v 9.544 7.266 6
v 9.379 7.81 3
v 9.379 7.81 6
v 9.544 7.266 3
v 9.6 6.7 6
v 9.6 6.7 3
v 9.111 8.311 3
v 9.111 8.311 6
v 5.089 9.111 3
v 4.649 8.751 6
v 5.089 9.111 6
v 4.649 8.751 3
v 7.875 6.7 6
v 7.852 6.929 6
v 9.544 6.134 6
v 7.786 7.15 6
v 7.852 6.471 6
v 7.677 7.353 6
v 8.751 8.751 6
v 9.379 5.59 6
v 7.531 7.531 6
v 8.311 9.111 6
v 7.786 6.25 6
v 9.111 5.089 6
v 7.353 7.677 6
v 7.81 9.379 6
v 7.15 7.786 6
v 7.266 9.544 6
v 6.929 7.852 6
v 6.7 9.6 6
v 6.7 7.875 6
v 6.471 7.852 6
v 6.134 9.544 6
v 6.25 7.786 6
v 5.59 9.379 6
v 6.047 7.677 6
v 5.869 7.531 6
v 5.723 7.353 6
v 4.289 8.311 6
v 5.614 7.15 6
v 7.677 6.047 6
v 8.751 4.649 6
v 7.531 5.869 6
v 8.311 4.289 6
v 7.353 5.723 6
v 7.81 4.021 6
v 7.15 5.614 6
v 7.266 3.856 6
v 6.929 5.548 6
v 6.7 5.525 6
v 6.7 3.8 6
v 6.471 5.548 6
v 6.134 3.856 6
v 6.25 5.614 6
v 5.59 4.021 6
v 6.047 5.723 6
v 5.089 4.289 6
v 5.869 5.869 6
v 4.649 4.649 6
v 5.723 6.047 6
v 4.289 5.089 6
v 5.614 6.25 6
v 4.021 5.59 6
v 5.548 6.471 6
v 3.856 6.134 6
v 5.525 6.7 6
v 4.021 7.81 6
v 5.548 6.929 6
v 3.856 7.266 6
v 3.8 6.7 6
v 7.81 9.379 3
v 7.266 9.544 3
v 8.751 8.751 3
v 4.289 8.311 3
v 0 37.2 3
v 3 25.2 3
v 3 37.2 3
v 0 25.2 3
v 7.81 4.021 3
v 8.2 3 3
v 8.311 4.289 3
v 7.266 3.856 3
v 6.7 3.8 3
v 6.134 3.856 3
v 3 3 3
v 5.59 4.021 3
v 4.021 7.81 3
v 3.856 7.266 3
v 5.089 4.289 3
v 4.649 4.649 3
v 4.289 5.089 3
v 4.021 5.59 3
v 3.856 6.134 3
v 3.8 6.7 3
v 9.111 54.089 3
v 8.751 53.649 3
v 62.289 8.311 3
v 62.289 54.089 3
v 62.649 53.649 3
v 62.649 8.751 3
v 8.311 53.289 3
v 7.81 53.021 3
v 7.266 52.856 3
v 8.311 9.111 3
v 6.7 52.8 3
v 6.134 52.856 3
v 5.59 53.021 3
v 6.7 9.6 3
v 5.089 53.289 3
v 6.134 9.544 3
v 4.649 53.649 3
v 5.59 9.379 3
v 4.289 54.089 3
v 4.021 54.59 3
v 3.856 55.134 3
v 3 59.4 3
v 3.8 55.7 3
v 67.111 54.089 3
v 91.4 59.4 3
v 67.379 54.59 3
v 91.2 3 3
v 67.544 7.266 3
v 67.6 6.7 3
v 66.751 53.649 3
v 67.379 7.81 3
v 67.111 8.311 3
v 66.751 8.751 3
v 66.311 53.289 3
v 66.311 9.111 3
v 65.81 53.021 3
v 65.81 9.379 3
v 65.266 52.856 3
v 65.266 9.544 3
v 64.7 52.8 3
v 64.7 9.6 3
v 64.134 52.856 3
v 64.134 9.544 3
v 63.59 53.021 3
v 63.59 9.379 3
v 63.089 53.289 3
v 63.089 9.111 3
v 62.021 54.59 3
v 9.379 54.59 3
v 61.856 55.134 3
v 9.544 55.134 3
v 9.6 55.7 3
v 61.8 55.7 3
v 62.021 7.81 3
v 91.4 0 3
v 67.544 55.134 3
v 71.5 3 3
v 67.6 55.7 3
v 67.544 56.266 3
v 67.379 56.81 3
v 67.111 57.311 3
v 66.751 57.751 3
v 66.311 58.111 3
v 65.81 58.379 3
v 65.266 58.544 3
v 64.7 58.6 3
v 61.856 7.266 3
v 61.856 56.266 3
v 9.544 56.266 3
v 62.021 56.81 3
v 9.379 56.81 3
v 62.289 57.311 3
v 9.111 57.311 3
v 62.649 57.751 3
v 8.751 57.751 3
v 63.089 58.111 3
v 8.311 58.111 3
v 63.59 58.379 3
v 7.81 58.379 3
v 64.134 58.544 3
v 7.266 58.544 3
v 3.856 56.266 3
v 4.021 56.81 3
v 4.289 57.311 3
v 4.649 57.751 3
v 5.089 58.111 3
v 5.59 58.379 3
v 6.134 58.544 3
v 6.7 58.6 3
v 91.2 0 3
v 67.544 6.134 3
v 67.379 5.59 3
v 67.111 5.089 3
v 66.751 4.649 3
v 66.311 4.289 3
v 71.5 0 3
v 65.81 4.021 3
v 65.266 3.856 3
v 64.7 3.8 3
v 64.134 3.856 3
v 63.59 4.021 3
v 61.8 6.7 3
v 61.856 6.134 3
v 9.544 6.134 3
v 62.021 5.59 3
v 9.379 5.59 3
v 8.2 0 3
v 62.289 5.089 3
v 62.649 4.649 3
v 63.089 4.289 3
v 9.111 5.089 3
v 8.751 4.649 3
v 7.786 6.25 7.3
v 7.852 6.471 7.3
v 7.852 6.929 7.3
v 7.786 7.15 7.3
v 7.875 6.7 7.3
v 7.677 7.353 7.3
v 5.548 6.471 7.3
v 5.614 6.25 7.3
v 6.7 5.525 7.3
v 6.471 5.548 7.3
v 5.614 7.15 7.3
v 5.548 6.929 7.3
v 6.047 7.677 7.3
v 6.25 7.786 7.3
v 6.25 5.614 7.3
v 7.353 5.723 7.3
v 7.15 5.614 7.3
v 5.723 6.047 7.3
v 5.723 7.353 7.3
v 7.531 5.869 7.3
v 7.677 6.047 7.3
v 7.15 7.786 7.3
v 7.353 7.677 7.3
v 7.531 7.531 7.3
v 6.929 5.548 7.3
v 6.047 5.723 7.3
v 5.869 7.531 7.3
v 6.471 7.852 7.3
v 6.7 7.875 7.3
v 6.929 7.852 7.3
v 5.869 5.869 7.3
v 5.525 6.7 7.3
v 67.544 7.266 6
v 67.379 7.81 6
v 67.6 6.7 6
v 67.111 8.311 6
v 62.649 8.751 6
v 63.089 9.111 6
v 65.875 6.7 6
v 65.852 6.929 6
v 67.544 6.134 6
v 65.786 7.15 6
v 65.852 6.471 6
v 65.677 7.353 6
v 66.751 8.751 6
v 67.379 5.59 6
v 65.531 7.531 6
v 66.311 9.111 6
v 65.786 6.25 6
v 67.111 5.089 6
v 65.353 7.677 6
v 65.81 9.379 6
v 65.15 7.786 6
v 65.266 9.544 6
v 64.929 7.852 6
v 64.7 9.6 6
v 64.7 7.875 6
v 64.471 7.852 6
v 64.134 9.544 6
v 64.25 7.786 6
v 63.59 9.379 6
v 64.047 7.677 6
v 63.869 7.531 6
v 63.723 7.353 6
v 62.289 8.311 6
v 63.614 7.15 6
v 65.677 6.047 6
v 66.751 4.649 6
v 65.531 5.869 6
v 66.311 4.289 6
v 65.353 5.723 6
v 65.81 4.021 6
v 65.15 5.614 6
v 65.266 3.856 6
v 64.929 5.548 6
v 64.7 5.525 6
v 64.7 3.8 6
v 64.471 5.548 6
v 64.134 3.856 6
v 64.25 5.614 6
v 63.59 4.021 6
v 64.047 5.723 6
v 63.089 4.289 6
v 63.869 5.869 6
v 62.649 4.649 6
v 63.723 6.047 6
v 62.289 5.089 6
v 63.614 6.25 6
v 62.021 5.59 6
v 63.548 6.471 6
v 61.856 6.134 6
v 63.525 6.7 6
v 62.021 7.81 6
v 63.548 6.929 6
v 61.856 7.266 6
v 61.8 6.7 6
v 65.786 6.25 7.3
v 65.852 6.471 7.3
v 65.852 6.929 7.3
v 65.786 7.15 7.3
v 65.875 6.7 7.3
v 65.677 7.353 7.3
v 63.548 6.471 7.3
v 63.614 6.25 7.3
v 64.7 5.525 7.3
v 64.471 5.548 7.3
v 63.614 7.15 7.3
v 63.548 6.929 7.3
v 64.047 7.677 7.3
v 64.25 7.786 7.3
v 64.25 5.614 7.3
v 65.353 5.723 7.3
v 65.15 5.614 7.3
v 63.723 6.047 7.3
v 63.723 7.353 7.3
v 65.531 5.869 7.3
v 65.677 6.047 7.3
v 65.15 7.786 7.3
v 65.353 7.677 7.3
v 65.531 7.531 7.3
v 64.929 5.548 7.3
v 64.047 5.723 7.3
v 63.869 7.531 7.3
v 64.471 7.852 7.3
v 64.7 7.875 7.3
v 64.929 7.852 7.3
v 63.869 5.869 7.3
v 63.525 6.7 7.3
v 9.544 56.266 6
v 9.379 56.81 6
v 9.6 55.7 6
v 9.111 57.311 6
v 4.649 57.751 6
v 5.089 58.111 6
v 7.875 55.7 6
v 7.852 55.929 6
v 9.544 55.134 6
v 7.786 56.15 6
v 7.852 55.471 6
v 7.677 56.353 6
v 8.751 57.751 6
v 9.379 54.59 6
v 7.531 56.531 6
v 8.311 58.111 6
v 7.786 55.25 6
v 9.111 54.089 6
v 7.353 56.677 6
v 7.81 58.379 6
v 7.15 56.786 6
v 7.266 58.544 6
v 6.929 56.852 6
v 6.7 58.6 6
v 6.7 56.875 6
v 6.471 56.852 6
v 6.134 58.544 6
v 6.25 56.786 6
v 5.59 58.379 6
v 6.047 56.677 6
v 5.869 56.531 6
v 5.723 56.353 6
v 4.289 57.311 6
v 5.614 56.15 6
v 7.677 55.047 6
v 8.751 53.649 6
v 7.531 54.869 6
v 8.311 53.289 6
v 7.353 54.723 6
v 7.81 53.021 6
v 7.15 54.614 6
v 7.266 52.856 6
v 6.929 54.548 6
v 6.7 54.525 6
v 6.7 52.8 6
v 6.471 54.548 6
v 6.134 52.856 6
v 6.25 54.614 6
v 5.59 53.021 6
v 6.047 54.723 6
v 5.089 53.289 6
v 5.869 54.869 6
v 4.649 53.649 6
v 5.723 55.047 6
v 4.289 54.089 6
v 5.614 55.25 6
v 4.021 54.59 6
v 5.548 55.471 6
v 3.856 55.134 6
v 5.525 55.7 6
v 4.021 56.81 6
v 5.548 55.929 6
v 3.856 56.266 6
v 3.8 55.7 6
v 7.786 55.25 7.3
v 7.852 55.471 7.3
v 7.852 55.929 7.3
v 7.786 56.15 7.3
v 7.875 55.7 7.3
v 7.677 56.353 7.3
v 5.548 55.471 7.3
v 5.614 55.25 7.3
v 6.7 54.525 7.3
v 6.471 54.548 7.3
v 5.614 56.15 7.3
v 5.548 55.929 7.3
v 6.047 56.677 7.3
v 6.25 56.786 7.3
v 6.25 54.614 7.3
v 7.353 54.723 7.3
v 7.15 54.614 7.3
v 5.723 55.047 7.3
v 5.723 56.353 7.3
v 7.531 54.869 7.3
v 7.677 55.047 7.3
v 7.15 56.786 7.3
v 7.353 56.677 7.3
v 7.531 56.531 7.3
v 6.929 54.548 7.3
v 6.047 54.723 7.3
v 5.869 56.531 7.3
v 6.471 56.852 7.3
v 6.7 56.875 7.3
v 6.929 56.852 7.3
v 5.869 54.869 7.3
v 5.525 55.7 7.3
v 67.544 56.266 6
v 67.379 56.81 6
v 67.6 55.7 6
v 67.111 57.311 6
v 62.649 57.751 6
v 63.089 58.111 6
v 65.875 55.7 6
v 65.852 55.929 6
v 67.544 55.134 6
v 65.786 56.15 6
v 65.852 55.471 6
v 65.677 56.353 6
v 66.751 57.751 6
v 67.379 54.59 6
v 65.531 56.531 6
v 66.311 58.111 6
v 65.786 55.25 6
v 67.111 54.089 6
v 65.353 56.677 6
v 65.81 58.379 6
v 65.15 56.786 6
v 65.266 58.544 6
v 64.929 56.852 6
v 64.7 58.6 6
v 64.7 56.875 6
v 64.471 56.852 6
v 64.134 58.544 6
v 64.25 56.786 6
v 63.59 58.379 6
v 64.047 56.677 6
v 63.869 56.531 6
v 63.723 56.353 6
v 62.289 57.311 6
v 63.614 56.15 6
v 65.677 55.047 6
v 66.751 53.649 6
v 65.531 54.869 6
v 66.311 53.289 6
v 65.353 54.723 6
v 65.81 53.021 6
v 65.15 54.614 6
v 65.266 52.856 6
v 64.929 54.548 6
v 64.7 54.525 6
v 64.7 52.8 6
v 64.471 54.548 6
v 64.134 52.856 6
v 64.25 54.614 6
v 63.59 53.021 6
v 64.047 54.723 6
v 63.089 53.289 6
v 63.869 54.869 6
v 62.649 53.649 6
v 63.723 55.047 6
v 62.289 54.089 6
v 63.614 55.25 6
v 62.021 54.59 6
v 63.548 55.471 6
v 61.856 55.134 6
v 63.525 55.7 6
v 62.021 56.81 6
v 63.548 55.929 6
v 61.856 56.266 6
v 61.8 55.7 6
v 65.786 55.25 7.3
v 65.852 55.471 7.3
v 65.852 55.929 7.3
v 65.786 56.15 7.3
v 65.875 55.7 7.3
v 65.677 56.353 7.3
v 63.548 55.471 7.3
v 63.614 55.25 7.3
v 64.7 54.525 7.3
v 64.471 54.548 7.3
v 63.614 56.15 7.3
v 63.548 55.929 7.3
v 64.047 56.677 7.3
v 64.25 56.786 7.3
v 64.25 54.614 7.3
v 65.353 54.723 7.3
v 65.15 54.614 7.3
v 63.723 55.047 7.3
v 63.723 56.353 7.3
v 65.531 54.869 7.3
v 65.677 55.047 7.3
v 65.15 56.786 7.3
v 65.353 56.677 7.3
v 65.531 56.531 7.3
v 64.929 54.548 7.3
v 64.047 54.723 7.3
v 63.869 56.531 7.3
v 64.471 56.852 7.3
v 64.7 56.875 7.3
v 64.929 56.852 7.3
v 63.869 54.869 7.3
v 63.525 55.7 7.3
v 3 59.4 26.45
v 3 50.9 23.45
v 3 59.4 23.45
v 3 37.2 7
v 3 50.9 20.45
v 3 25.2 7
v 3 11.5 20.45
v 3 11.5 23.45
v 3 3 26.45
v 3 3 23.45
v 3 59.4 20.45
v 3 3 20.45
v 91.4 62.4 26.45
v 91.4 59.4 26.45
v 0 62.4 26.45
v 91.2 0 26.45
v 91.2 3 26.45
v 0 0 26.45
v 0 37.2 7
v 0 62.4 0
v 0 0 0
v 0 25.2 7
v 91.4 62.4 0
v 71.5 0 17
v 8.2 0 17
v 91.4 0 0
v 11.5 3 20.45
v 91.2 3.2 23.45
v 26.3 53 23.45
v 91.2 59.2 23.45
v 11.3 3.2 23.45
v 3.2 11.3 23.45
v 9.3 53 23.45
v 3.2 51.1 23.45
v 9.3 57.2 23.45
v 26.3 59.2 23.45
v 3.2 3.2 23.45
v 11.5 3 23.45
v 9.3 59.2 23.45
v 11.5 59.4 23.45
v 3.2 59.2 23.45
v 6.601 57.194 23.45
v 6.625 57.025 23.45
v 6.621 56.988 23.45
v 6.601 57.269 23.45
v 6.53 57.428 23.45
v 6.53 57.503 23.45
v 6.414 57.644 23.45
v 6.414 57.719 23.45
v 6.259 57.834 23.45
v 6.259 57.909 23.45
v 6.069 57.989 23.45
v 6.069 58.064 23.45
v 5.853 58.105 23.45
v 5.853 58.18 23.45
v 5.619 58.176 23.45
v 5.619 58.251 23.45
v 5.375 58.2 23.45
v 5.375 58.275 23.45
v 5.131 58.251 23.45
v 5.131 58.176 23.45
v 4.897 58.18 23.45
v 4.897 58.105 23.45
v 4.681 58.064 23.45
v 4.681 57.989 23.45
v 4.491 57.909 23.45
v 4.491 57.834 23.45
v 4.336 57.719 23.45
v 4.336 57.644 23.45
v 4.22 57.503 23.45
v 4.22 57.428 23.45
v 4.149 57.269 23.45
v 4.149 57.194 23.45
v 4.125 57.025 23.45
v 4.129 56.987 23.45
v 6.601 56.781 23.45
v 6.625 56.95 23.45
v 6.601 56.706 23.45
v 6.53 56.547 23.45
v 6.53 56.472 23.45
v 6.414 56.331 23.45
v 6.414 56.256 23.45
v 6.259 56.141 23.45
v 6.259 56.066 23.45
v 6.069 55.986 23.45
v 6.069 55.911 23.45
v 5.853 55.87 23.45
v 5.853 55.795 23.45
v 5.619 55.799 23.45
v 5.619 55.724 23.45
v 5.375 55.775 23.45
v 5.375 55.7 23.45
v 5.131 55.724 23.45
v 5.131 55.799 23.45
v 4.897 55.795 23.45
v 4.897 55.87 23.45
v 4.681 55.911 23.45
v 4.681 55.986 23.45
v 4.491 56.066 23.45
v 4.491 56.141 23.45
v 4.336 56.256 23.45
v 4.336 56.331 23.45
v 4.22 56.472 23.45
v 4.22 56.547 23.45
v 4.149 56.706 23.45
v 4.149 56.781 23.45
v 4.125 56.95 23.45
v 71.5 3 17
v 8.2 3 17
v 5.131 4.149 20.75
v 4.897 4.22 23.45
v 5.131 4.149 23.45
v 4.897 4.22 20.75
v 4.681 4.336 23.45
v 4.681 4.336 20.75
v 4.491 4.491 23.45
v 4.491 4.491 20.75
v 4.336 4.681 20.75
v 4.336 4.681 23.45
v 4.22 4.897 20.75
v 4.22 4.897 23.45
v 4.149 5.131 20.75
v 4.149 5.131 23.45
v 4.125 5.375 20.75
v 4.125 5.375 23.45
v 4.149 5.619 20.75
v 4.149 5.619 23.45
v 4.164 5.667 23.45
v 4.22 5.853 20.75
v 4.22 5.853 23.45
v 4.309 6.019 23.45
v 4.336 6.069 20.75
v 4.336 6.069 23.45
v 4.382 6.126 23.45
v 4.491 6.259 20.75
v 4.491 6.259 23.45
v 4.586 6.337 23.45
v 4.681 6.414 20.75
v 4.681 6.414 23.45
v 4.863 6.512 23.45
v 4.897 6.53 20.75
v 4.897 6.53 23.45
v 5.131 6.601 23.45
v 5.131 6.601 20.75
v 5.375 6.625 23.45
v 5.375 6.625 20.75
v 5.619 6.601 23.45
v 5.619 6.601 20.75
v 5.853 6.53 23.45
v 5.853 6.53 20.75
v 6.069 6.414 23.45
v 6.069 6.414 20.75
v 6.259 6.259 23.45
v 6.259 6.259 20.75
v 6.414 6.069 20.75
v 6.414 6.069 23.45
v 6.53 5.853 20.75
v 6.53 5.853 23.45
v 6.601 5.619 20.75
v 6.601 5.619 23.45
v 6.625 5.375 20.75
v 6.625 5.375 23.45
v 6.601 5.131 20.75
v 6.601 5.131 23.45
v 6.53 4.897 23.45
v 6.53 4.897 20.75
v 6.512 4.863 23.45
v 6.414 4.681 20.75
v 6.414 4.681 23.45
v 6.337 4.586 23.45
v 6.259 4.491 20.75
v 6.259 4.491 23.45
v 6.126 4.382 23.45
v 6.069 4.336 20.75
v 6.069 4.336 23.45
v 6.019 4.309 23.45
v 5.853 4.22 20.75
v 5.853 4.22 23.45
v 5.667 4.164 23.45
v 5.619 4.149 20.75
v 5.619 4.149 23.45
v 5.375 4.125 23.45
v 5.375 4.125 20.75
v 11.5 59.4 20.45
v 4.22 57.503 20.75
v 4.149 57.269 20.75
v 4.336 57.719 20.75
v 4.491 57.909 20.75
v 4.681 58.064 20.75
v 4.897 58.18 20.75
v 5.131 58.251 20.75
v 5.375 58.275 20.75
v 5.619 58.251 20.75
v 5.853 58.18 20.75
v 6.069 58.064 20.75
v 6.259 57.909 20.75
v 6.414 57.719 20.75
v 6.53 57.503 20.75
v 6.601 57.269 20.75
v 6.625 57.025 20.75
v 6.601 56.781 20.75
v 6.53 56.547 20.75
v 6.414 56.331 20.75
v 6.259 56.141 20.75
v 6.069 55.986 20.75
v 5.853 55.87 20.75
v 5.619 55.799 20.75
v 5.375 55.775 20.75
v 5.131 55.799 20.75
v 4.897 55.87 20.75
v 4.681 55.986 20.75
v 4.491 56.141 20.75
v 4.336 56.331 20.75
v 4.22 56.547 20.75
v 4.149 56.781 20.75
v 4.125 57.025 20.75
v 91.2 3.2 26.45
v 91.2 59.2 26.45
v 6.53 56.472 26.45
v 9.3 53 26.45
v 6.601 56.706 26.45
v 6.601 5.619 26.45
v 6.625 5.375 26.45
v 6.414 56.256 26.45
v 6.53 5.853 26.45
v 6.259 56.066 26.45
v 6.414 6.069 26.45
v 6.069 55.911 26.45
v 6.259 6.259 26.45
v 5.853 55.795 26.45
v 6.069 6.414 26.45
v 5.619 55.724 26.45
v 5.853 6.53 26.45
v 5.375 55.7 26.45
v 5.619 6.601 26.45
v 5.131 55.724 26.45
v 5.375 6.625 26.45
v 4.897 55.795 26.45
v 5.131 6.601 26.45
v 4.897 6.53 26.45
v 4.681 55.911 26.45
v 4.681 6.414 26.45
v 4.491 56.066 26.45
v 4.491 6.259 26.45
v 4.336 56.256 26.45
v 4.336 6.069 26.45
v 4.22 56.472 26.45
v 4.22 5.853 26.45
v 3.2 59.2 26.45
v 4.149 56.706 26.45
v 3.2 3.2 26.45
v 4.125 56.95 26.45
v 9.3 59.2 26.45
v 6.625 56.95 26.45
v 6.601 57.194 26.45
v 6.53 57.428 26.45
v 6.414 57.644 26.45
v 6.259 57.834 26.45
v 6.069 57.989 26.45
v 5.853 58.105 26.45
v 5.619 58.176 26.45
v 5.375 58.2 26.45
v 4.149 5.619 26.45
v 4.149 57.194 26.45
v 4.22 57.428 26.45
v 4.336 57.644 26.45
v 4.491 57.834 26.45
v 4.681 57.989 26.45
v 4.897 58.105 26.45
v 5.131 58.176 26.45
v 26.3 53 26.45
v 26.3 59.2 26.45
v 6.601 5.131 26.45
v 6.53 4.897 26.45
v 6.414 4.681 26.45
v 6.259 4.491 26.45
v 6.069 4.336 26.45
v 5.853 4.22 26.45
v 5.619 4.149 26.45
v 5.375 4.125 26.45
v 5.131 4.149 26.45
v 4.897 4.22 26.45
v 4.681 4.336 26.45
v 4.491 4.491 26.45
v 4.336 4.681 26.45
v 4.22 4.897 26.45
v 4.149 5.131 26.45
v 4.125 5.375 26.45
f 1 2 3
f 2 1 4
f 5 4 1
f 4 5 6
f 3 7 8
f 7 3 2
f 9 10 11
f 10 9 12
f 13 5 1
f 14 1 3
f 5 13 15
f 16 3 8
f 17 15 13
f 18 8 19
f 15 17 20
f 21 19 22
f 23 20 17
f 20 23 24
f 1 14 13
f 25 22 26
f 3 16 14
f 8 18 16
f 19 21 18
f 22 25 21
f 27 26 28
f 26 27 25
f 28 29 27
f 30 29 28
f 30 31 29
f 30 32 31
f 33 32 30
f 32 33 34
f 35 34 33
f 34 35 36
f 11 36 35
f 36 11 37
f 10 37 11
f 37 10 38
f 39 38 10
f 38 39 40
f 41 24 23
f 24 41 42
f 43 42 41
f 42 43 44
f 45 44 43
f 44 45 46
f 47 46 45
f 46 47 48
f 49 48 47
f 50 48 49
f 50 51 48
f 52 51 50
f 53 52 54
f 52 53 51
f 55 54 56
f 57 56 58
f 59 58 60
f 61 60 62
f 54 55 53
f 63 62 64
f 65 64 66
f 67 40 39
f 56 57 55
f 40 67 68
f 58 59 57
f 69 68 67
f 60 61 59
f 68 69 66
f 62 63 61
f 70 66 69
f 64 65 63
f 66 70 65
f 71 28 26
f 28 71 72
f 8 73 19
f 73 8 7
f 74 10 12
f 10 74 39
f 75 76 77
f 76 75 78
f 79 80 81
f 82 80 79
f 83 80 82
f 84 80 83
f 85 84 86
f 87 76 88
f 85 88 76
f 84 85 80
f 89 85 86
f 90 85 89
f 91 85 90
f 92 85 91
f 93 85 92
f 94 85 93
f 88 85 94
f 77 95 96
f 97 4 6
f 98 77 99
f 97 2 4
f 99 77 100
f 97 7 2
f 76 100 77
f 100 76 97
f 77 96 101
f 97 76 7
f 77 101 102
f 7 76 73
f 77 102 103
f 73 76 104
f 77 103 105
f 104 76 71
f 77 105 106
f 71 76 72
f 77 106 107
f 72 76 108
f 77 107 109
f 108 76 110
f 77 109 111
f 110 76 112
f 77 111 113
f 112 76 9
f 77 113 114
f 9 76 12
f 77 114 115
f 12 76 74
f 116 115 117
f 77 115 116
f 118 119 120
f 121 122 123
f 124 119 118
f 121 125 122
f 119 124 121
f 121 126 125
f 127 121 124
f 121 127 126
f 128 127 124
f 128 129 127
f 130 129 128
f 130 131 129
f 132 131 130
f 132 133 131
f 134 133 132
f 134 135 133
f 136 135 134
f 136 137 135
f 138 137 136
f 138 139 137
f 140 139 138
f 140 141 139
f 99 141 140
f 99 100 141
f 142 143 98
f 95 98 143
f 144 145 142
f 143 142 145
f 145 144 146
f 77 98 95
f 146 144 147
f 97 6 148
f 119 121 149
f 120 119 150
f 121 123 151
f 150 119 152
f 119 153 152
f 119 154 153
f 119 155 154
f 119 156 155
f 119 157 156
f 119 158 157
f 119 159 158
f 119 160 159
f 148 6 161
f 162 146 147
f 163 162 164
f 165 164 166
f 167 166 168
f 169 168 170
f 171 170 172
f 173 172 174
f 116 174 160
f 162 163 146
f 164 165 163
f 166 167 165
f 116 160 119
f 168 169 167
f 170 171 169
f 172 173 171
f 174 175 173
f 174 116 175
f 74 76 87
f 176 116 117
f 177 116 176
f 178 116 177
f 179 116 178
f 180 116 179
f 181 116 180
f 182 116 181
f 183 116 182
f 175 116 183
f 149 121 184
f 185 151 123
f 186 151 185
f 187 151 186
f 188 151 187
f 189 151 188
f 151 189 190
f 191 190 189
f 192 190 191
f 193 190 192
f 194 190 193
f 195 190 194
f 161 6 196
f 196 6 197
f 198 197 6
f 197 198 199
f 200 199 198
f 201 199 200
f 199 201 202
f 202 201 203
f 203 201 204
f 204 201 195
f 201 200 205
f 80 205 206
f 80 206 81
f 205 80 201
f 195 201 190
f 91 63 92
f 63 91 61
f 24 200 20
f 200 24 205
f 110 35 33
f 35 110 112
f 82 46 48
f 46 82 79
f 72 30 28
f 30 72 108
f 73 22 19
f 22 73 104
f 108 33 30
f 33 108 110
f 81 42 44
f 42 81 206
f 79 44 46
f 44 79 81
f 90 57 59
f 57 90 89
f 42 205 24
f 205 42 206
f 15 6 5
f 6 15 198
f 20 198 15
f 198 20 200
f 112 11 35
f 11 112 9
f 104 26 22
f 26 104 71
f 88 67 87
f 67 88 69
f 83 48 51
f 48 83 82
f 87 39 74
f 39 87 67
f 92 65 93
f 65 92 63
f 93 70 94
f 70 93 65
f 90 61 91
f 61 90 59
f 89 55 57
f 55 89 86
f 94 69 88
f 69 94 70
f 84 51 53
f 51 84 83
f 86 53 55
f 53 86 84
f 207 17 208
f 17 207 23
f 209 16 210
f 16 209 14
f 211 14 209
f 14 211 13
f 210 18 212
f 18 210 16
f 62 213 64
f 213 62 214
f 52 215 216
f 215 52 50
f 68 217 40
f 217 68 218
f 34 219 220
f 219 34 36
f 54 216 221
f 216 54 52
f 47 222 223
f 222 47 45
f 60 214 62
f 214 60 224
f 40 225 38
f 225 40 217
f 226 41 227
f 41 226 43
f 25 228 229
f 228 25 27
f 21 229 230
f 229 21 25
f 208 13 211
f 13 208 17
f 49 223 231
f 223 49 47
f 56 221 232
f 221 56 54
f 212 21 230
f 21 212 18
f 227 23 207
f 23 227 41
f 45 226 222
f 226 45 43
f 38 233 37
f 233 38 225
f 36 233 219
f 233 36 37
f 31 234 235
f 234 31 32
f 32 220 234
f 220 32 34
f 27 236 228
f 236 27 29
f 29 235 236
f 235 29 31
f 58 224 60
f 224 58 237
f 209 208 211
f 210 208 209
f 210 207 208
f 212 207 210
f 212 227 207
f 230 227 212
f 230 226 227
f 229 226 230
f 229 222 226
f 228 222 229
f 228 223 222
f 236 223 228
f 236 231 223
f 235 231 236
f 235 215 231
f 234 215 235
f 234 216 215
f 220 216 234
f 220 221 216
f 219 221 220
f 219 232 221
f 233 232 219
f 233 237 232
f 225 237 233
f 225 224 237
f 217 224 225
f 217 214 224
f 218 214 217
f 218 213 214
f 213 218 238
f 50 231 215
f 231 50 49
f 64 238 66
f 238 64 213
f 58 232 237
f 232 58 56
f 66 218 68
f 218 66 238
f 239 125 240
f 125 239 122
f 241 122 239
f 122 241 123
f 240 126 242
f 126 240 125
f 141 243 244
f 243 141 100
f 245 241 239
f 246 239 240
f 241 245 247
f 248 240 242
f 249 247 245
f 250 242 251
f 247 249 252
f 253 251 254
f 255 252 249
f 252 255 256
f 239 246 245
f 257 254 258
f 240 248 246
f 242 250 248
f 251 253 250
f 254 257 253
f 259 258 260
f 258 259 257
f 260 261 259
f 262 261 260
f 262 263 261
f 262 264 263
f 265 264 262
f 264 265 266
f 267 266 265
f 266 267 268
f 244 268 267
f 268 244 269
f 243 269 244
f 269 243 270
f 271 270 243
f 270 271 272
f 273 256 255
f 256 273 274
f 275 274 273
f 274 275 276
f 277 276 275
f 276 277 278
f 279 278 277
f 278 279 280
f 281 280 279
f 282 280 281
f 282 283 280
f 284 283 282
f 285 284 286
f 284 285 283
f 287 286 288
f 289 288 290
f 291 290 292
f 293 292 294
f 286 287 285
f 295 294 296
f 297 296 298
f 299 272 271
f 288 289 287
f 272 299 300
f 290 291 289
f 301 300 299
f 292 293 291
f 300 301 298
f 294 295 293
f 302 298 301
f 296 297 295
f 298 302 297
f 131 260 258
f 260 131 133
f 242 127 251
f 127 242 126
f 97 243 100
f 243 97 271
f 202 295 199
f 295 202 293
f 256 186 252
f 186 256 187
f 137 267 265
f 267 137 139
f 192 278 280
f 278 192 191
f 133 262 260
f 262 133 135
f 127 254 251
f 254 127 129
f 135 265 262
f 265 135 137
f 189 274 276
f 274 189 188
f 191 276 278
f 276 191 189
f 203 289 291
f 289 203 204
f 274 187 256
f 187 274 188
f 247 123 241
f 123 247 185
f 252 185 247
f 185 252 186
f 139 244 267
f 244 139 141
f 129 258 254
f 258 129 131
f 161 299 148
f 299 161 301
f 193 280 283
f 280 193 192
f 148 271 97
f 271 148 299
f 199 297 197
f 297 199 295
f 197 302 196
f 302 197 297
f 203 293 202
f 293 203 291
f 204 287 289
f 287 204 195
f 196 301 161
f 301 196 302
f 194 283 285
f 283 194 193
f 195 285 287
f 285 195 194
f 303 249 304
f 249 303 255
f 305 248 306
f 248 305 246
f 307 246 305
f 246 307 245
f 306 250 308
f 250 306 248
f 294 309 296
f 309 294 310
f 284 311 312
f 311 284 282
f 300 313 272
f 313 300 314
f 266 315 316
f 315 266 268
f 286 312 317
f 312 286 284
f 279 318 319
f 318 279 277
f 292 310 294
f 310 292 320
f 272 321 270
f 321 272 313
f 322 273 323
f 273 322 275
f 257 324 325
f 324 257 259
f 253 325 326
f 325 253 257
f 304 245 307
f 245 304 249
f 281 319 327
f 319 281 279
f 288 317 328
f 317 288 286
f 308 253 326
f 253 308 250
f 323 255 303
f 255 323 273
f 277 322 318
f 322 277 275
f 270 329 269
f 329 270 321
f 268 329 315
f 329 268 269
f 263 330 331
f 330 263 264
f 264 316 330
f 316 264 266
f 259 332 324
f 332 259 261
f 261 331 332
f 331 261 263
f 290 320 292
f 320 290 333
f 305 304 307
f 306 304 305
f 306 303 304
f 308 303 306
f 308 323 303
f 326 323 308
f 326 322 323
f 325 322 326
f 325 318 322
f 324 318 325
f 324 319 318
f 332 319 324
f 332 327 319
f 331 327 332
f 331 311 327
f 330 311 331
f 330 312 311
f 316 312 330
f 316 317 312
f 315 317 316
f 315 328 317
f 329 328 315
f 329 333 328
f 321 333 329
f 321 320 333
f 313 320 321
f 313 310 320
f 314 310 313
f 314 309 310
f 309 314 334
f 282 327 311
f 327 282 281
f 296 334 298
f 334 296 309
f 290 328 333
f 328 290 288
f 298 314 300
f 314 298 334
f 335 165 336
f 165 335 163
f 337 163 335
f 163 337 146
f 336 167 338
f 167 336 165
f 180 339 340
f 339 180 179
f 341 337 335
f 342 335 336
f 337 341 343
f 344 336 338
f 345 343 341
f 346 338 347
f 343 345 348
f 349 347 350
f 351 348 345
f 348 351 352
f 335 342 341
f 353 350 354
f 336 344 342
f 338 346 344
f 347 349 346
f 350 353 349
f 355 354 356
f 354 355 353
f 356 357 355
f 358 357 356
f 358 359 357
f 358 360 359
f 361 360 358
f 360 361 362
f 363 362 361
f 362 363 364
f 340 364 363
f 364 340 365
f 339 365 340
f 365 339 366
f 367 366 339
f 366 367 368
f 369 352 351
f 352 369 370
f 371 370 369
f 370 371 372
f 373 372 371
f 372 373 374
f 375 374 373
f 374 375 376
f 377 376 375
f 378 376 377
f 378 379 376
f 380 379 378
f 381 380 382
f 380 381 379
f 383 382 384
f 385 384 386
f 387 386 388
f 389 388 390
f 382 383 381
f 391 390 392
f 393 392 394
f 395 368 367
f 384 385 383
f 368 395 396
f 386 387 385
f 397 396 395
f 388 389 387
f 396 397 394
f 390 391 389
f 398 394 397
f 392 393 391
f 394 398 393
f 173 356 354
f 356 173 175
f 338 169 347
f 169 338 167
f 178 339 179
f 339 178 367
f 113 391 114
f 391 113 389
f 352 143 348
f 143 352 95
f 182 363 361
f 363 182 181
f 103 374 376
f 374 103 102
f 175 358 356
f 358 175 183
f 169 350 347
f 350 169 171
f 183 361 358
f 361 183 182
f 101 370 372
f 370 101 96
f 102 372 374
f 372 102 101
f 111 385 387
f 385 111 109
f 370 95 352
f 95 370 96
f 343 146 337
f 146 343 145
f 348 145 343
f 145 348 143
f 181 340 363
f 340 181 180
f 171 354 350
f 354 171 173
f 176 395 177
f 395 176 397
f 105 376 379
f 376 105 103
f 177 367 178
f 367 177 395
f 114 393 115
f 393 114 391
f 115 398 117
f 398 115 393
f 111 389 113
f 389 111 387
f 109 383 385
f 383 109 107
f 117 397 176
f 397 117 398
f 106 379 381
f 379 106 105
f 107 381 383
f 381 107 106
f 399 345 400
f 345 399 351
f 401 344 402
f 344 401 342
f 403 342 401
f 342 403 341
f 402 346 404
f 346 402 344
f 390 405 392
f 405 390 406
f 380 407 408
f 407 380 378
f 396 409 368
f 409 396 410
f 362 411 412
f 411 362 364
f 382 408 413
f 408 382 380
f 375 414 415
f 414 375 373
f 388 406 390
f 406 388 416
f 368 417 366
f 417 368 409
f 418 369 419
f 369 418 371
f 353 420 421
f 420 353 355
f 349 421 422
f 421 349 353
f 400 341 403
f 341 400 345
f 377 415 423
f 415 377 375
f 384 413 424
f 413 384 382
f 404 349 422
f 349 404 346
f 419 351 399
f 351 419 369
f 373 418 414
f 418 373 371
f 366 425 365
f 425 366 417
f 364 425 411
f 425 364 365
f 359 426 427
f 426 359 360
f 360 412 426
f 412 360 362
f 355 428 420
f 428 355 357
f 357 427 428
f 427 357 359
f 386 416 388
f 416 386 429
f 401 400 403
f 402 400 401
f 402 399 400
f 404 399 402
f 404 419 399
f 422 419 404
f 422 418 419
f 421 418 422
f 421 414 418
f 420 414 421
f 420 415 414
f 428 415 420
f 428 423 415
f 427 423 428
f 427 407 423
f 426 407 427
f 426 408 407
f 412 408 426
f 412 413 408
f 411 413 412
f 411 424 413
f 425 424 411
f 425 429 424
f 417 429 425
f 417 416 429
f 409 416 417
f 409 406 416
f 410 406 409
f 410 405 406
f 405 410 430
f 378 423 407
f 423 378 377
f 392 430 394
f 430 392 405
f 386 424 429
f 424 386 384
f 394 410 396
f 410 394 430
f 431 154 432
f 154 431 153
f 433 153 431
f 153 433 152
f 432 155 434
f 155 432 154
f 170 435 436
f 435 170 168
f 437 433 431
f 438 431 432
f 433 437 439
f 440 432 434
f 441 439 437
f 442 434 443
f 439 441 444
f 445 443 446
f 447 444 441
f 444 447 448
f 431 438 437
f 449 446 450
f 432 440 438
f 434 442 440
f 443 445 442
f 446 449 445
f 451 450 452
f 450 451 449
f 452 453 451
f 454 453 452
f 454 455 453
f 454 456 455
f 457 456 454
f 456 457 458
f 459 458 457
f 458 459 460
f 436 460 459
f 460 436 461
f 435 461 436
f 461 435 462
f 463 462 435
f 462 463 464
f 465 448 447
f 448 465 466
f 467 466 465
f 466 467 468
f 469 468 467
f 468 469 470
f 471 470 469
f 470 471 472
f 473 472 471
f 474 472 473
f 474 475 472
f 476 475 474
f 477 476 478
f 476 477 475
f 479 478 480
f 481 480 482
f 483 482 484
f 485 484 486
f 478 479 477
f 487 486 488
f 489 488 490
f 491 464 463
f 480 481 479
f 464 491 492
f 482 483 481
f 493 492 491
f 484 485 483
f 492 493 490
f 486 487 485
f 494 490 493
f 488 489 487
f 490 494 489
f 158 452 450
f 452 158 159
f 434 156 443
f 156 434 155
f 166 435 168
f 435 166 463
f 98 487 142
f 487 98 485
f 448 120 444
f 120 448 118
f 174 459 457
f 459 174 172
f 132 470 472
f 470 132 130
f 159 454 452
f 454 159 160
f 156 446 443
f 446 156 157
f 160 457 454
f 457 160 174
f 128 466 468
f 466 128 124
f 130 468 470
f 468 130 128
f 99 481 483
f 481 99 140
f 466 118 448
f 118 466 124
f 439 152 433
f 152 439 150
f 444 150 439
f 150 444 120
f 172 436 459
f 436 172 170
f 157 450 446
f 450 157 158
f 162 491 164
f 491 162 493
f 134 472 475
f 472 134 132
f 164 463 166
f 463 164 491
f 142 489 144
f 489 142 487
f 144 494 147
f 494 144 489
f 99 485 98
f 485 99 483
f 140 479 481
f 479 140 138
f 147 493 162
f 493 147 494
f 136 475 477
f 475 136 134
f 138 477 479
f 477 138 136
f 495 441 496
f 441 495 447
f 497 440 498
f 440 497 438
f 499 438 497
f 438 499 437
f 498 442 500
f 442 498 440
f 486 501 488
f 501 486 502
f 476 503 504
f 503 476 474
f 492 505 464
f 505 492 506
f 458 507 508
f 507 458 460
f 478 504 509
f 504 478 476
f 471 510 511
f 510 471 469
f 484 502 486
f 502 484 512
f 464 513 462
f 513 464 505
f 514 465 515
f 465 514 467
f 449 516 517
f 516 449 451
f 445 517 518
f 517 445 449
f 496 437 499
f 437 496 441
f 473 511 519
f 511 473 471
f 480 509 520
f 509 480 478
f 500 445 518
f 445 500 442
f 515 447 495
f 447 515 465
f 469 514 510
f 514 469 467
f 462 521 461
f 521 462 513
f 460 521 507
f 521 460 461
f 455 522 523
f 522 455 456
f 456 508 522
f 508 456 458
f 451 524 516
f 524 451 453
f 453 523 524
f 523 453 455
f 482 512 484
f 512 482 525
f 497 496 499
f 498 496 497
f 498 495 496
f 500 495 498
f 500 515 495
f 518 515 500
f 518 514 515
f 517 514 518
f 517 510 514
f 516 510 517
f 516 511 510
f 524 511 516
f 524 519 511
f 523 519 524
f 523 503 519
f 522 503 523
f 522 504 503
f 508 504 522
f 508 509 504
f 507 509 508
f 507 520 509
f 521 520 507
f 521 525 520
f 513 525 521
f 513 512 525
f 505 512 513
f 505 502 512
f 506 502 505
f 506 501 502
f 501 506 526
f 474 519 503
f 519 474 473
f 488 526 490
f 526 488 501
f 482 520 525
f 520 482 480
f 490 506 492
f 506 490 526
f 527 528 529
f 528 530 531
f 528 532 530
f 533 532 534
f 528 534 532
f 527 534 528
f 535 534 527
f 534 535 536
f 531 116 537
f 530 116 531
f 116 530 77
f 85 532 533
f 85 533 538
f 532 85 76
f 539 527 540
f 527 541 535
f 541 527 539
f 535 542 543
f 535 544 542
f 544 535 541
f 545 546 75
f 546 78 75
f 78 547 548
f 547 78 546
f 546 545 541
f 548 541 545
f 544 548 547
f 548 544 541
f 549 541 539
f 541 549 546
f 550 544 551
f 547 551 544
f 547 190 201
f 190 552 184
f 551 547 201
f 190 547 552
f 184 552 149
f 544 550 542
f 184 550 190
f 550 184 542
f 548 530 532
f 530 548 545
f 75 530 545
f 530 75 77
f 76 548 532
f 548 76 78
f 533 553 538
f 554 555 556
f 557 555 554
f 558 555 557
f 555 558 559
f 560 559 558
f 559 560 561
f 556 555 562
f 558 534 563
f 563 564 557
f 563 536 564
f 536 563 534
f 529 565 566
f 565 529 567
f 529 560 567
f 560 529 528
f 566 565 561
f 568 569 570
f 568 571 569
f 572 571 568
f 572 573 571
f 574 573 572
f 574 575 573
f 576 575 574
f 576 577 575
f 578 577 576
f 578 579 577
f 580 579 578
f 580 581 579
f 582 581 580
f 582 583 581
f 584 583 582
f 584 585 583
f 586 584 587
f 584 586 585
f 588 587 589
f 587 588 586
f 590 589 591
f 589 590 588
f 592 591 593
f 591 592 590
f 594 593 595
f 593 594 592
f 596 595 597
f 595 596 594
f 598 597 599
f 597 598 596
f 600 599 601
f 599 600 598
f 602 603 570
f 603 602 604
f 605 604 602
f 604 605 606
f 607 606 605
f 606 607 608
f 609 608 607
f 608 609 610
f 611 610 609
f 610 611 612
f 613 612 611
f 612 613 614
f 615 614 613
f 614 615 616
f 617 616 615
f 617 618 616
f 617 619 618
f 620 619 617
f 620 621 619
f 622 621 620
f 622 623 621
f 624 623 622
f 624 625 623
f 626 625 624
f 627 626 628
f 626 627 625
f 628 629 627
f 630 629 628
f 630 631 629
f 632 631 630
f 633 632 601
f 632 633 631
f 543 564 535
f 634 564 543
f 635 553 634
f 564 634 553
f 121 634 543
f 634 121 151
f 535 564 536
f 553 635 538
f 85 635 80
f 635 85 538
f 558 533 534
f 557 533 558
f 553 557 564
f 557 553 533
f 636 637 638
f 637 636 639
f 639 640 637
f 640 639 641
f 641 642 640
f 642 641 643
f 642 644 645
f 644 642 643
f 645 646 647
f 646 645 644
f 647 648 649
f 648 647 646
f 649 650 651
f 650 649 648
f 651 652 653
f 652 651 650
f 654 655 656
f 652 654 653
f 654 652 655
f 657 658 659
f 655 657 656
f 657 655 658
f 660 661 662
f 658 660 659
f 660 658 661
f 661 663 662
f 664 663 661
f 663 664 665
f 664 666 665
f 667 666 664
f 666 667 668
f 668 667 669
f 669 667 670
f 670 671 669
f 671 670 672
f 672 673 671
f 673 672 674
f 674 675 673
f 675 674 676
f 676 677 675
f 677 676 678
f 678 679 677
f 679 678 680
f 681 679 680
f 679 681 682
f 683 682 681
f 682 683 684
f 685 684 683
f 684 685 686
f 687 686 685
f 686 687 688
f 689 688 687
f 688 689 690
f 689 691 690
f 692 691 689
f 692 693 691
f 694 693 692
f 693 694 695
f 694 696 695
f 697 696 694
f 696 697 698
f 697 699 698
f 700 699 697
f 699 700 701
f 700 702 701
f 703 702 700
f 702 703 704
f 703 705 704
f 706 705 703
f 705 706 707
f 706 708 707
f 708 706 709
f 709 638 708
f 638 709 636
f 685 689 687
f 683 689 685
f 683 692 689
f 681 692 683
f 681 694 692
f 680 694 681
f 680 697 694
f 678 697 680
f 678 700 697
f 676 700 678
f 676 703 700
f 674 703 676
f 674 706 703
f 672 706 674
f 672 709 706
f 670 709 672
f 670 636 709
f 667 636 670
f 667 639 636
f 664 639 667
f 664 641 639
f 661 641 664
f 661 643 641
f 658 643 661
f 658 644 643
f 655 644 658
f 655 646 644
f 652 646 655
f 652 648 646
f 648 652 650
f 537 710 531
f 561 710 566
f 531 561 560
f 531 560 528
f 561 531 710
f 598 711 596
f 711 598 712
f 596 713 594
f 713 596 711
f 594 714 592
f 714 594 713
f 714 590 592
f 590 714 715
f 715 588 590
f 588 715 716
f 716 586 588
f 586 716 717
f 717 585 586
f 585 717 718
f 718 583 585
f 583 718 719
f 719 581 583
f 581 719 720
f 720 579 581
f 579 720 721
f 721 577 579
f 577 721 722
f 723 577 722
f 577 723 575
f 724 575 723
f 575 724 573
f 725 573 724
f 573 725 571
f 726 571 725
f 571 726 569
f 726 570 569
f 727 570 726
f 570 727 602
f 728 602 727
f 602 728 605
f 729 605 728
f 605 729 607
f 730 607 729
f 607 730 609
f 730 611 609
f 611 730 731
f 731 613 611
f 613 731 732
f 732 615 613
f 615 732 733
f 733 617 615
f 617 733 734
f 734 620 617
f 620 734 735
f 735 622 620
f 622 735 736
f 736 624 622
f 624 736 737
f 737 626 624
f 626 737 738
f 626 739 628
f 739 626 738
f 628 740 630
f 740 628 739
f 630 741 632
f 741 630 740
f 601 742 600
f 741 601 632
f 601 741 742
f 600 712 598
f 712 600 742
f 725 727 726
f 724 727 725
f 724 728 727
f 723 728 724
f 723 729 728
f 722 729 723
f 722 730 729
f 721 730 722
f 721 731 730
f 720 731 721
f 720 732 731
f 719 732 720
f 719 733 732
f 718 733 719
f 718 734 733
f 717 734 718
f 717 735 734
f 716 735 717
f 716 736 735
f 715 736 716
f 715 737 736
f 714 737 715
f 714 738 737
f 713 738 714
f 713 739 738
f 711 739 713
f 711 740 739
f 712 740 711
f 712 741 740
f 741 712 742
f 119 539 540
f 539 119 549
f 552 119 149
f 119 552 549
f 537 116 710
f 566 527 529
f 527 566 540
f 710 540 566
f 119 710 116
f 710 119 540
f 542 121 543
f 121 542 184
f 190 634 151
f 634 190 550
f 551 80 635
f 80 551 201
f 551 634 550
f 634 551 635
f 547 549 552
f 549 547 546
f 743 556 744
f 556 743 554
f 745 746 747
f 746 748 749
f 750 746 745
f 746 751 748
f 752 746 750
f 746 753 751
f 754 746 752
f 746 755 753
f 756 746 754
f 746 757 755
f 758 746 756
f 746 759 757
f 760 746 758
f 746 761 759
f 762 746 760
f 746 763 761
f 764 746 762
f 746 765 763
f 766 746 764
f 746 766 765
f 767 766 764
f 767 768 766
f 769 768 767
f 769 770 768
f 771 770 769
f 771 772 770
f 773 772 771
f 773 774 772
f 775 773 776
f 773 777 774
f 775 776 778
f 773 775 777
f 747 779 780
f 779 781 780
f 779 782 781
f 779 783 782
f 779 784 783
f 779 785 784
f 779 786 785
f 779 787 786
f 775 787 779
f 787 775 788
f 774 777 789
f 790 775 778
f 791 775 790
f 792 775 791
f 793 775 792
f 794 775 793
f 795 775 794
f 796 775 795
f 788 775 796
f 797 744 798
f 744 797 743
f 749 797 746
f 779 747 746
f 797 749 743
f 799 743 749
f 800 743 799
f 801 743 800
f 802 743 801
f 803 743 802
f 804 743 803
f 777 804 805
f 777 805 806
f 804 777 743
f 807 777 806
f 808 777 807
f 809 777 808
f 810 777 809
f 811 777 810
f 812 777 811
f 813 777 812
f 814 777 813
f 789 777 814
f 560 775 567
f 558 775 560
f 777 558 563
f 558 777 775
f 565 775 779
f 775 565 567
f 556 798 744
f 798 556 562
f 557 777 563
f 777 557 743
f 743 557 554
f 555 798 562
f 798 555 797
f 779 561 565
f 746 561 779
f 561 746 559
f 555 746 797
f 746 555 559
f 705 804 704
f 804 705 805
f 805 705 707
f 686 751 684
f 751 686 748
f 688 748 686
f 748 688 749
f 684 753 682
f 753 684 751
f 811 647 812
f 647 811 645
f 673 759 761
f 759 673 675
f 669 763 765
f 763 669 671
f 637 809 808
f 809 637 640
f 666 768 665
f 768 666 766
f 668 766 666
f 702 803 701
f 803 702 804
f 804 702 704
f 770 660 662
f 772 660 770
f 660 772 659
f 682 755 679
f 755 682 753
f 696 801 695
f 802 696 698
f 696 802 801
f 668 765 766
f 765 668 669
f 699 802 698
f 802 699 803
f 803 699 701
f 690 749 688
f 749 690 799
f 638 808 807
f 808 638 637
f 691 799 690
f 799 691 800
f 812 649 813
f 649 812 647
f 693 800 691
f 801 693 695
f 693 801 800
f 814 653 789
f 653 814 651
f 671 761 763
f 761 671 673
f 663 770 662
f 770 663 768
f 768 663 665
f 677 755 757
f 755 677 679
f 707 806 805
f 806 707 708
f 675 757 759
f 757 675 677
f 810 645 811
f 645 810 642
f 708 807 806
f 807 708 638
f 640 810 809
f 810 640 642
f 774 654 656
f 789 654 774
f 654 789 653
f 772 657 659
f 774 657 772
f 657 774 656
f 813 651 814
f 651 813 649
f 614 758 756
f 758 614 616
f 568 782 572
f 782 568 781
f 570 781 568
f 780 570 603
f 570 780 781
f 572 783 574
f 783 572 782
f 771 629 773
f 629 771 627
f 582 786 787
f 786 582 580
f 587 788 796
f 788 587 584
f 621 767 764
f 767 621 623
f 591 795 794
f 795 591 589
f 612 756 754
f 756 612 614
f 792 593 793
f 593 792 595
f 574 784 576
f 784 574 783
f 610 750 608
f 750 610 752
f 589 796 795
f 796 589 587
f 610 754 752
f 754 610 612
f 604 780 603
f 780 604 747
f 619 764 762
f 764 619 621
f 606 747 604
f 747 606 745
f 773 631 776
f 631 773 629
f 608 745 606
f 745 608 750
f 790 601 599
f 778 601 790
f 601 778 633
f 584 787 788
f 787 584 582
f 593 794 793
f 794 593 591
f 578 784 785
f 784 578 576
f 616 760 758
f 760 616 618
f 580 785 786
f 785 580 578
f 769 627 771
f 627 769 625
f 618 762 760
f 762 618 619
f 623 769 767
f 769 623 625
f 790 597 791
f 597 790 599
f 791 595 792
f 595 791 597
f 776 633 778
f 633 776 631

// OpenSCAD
$fn = 32;

//tolerance = 0.15;
tolerance = 0.2;
thickness = 3;

width = 85;
height = 56;
bottom_spacing = 3;
hole_d = 2.75;
outer_hole_d = 6.2;
board_thickness = 1.3;
components_height = 15.75;
bolt_hole = 2.5;

side_height = components_height + bottom_spacing + board_thickness + tolerance * 2 + thickness;

case();
translate([0, 0, side_height])
    lid();

module lid() {
    difference() {
        translate([thickness + tolerance, thickness + tolerance, 0])
            cube([width + thickness, height, thickness]);
        translate([thickness + 6.3, height - thickness, 0])
            cube([17, tolerance + 6, thickness]);
        
        translate([thickness, thickness, 0])
            translate([thickness - bolt_hole / 4, thickness - bolt_hole  / 4])
                cylinder(d = bolt_hole, h = thickness);
        
        translate([thickness, height + tolerance + hole_d / 2 - thickness, 0])
        translate([thickness - bolt_hole / 4, thickness - bolt_hole  / 4])
                cylinder(d = bolt_hole, h = thickness);
    }
}

module case() {
    cube([width + tolerance * 2 + thickness * 2, height + tolerance * 2 + thickness * 2, thickness]);
        
    translate([tolerance + thickness, tolerance + thickness, thickness]) {
        translate([3.5, 3.5, 0]) board_mount();
        translate([3.5 + 58, 3.5, 0]) board_mount();
        translate([3.5, height - 3.5, 0]) board_mount();
        translate([3.5 + 58, height - 3.5, 0]) board_mount();
    }

    union() {
        translate([0, height + tolerance * 2 + thickness, thickness])
            cube([width + tolerance * 2 + thickness * 2, thickness, side_height]);

        difference() {
            translate([0, 0, thickness])
                cube([thickness, height + thickness * 2 + tolerance * 2, side_height]);
            translate([0, height / 2 + thickness + tolerance - 6, thickness])
                cube([thickness, 12, 4]);
        }

        translate([width - 25 + (thickness * 2 + bolt_hole) + thickness, 0, thickness])
            cube([25 - (thickness * 2 + bolt_hole) + tolerance + thickness, thickness, side_height]);

        translate([thickness, 0, thickness])
            cube([5 + tolerance, thickness, side_height]);

        translate([thickness, 0, thickness + 14])
            cube([width, thickness, side_height - 14]);
        
        translate([thickness, thickness, side_height - thickness])
        bolt_mount();
    translate([thickness, height + thickness + tolerance * 2, side_height - thickness])
        rotate([0, 0, -90])
            bolt_mount();
    }
}


module bolt_mount() {
    linear_extrude(height = thickness)
        difference() {
            polygon([
                [0, 0],
                [thickness * 2 + bolt_hole, 0],
                [0, thickness * 2 + bolt_hole],
            ]);
            translate([thickness - bolt_hole / 4, thickness - bolt_hole  / 4])
                circle(d = bolt_hole);
        }
    linear_extrude(height = 0.3)
        polygon([
            [0, 0],
            [thickness * 2 + bolt_hole, 0],
            [0, thickness * 2 + bolt_hole],
        ]);
}

module board_mount() {
    cylinder(d = outer_hole_d - tolerance * 2, h = bottom_spacing);
    translate([0, 0, bottom_spacing])
        cylinder(d = hole_d - tolerance * 2, h = board_thickness);
}
